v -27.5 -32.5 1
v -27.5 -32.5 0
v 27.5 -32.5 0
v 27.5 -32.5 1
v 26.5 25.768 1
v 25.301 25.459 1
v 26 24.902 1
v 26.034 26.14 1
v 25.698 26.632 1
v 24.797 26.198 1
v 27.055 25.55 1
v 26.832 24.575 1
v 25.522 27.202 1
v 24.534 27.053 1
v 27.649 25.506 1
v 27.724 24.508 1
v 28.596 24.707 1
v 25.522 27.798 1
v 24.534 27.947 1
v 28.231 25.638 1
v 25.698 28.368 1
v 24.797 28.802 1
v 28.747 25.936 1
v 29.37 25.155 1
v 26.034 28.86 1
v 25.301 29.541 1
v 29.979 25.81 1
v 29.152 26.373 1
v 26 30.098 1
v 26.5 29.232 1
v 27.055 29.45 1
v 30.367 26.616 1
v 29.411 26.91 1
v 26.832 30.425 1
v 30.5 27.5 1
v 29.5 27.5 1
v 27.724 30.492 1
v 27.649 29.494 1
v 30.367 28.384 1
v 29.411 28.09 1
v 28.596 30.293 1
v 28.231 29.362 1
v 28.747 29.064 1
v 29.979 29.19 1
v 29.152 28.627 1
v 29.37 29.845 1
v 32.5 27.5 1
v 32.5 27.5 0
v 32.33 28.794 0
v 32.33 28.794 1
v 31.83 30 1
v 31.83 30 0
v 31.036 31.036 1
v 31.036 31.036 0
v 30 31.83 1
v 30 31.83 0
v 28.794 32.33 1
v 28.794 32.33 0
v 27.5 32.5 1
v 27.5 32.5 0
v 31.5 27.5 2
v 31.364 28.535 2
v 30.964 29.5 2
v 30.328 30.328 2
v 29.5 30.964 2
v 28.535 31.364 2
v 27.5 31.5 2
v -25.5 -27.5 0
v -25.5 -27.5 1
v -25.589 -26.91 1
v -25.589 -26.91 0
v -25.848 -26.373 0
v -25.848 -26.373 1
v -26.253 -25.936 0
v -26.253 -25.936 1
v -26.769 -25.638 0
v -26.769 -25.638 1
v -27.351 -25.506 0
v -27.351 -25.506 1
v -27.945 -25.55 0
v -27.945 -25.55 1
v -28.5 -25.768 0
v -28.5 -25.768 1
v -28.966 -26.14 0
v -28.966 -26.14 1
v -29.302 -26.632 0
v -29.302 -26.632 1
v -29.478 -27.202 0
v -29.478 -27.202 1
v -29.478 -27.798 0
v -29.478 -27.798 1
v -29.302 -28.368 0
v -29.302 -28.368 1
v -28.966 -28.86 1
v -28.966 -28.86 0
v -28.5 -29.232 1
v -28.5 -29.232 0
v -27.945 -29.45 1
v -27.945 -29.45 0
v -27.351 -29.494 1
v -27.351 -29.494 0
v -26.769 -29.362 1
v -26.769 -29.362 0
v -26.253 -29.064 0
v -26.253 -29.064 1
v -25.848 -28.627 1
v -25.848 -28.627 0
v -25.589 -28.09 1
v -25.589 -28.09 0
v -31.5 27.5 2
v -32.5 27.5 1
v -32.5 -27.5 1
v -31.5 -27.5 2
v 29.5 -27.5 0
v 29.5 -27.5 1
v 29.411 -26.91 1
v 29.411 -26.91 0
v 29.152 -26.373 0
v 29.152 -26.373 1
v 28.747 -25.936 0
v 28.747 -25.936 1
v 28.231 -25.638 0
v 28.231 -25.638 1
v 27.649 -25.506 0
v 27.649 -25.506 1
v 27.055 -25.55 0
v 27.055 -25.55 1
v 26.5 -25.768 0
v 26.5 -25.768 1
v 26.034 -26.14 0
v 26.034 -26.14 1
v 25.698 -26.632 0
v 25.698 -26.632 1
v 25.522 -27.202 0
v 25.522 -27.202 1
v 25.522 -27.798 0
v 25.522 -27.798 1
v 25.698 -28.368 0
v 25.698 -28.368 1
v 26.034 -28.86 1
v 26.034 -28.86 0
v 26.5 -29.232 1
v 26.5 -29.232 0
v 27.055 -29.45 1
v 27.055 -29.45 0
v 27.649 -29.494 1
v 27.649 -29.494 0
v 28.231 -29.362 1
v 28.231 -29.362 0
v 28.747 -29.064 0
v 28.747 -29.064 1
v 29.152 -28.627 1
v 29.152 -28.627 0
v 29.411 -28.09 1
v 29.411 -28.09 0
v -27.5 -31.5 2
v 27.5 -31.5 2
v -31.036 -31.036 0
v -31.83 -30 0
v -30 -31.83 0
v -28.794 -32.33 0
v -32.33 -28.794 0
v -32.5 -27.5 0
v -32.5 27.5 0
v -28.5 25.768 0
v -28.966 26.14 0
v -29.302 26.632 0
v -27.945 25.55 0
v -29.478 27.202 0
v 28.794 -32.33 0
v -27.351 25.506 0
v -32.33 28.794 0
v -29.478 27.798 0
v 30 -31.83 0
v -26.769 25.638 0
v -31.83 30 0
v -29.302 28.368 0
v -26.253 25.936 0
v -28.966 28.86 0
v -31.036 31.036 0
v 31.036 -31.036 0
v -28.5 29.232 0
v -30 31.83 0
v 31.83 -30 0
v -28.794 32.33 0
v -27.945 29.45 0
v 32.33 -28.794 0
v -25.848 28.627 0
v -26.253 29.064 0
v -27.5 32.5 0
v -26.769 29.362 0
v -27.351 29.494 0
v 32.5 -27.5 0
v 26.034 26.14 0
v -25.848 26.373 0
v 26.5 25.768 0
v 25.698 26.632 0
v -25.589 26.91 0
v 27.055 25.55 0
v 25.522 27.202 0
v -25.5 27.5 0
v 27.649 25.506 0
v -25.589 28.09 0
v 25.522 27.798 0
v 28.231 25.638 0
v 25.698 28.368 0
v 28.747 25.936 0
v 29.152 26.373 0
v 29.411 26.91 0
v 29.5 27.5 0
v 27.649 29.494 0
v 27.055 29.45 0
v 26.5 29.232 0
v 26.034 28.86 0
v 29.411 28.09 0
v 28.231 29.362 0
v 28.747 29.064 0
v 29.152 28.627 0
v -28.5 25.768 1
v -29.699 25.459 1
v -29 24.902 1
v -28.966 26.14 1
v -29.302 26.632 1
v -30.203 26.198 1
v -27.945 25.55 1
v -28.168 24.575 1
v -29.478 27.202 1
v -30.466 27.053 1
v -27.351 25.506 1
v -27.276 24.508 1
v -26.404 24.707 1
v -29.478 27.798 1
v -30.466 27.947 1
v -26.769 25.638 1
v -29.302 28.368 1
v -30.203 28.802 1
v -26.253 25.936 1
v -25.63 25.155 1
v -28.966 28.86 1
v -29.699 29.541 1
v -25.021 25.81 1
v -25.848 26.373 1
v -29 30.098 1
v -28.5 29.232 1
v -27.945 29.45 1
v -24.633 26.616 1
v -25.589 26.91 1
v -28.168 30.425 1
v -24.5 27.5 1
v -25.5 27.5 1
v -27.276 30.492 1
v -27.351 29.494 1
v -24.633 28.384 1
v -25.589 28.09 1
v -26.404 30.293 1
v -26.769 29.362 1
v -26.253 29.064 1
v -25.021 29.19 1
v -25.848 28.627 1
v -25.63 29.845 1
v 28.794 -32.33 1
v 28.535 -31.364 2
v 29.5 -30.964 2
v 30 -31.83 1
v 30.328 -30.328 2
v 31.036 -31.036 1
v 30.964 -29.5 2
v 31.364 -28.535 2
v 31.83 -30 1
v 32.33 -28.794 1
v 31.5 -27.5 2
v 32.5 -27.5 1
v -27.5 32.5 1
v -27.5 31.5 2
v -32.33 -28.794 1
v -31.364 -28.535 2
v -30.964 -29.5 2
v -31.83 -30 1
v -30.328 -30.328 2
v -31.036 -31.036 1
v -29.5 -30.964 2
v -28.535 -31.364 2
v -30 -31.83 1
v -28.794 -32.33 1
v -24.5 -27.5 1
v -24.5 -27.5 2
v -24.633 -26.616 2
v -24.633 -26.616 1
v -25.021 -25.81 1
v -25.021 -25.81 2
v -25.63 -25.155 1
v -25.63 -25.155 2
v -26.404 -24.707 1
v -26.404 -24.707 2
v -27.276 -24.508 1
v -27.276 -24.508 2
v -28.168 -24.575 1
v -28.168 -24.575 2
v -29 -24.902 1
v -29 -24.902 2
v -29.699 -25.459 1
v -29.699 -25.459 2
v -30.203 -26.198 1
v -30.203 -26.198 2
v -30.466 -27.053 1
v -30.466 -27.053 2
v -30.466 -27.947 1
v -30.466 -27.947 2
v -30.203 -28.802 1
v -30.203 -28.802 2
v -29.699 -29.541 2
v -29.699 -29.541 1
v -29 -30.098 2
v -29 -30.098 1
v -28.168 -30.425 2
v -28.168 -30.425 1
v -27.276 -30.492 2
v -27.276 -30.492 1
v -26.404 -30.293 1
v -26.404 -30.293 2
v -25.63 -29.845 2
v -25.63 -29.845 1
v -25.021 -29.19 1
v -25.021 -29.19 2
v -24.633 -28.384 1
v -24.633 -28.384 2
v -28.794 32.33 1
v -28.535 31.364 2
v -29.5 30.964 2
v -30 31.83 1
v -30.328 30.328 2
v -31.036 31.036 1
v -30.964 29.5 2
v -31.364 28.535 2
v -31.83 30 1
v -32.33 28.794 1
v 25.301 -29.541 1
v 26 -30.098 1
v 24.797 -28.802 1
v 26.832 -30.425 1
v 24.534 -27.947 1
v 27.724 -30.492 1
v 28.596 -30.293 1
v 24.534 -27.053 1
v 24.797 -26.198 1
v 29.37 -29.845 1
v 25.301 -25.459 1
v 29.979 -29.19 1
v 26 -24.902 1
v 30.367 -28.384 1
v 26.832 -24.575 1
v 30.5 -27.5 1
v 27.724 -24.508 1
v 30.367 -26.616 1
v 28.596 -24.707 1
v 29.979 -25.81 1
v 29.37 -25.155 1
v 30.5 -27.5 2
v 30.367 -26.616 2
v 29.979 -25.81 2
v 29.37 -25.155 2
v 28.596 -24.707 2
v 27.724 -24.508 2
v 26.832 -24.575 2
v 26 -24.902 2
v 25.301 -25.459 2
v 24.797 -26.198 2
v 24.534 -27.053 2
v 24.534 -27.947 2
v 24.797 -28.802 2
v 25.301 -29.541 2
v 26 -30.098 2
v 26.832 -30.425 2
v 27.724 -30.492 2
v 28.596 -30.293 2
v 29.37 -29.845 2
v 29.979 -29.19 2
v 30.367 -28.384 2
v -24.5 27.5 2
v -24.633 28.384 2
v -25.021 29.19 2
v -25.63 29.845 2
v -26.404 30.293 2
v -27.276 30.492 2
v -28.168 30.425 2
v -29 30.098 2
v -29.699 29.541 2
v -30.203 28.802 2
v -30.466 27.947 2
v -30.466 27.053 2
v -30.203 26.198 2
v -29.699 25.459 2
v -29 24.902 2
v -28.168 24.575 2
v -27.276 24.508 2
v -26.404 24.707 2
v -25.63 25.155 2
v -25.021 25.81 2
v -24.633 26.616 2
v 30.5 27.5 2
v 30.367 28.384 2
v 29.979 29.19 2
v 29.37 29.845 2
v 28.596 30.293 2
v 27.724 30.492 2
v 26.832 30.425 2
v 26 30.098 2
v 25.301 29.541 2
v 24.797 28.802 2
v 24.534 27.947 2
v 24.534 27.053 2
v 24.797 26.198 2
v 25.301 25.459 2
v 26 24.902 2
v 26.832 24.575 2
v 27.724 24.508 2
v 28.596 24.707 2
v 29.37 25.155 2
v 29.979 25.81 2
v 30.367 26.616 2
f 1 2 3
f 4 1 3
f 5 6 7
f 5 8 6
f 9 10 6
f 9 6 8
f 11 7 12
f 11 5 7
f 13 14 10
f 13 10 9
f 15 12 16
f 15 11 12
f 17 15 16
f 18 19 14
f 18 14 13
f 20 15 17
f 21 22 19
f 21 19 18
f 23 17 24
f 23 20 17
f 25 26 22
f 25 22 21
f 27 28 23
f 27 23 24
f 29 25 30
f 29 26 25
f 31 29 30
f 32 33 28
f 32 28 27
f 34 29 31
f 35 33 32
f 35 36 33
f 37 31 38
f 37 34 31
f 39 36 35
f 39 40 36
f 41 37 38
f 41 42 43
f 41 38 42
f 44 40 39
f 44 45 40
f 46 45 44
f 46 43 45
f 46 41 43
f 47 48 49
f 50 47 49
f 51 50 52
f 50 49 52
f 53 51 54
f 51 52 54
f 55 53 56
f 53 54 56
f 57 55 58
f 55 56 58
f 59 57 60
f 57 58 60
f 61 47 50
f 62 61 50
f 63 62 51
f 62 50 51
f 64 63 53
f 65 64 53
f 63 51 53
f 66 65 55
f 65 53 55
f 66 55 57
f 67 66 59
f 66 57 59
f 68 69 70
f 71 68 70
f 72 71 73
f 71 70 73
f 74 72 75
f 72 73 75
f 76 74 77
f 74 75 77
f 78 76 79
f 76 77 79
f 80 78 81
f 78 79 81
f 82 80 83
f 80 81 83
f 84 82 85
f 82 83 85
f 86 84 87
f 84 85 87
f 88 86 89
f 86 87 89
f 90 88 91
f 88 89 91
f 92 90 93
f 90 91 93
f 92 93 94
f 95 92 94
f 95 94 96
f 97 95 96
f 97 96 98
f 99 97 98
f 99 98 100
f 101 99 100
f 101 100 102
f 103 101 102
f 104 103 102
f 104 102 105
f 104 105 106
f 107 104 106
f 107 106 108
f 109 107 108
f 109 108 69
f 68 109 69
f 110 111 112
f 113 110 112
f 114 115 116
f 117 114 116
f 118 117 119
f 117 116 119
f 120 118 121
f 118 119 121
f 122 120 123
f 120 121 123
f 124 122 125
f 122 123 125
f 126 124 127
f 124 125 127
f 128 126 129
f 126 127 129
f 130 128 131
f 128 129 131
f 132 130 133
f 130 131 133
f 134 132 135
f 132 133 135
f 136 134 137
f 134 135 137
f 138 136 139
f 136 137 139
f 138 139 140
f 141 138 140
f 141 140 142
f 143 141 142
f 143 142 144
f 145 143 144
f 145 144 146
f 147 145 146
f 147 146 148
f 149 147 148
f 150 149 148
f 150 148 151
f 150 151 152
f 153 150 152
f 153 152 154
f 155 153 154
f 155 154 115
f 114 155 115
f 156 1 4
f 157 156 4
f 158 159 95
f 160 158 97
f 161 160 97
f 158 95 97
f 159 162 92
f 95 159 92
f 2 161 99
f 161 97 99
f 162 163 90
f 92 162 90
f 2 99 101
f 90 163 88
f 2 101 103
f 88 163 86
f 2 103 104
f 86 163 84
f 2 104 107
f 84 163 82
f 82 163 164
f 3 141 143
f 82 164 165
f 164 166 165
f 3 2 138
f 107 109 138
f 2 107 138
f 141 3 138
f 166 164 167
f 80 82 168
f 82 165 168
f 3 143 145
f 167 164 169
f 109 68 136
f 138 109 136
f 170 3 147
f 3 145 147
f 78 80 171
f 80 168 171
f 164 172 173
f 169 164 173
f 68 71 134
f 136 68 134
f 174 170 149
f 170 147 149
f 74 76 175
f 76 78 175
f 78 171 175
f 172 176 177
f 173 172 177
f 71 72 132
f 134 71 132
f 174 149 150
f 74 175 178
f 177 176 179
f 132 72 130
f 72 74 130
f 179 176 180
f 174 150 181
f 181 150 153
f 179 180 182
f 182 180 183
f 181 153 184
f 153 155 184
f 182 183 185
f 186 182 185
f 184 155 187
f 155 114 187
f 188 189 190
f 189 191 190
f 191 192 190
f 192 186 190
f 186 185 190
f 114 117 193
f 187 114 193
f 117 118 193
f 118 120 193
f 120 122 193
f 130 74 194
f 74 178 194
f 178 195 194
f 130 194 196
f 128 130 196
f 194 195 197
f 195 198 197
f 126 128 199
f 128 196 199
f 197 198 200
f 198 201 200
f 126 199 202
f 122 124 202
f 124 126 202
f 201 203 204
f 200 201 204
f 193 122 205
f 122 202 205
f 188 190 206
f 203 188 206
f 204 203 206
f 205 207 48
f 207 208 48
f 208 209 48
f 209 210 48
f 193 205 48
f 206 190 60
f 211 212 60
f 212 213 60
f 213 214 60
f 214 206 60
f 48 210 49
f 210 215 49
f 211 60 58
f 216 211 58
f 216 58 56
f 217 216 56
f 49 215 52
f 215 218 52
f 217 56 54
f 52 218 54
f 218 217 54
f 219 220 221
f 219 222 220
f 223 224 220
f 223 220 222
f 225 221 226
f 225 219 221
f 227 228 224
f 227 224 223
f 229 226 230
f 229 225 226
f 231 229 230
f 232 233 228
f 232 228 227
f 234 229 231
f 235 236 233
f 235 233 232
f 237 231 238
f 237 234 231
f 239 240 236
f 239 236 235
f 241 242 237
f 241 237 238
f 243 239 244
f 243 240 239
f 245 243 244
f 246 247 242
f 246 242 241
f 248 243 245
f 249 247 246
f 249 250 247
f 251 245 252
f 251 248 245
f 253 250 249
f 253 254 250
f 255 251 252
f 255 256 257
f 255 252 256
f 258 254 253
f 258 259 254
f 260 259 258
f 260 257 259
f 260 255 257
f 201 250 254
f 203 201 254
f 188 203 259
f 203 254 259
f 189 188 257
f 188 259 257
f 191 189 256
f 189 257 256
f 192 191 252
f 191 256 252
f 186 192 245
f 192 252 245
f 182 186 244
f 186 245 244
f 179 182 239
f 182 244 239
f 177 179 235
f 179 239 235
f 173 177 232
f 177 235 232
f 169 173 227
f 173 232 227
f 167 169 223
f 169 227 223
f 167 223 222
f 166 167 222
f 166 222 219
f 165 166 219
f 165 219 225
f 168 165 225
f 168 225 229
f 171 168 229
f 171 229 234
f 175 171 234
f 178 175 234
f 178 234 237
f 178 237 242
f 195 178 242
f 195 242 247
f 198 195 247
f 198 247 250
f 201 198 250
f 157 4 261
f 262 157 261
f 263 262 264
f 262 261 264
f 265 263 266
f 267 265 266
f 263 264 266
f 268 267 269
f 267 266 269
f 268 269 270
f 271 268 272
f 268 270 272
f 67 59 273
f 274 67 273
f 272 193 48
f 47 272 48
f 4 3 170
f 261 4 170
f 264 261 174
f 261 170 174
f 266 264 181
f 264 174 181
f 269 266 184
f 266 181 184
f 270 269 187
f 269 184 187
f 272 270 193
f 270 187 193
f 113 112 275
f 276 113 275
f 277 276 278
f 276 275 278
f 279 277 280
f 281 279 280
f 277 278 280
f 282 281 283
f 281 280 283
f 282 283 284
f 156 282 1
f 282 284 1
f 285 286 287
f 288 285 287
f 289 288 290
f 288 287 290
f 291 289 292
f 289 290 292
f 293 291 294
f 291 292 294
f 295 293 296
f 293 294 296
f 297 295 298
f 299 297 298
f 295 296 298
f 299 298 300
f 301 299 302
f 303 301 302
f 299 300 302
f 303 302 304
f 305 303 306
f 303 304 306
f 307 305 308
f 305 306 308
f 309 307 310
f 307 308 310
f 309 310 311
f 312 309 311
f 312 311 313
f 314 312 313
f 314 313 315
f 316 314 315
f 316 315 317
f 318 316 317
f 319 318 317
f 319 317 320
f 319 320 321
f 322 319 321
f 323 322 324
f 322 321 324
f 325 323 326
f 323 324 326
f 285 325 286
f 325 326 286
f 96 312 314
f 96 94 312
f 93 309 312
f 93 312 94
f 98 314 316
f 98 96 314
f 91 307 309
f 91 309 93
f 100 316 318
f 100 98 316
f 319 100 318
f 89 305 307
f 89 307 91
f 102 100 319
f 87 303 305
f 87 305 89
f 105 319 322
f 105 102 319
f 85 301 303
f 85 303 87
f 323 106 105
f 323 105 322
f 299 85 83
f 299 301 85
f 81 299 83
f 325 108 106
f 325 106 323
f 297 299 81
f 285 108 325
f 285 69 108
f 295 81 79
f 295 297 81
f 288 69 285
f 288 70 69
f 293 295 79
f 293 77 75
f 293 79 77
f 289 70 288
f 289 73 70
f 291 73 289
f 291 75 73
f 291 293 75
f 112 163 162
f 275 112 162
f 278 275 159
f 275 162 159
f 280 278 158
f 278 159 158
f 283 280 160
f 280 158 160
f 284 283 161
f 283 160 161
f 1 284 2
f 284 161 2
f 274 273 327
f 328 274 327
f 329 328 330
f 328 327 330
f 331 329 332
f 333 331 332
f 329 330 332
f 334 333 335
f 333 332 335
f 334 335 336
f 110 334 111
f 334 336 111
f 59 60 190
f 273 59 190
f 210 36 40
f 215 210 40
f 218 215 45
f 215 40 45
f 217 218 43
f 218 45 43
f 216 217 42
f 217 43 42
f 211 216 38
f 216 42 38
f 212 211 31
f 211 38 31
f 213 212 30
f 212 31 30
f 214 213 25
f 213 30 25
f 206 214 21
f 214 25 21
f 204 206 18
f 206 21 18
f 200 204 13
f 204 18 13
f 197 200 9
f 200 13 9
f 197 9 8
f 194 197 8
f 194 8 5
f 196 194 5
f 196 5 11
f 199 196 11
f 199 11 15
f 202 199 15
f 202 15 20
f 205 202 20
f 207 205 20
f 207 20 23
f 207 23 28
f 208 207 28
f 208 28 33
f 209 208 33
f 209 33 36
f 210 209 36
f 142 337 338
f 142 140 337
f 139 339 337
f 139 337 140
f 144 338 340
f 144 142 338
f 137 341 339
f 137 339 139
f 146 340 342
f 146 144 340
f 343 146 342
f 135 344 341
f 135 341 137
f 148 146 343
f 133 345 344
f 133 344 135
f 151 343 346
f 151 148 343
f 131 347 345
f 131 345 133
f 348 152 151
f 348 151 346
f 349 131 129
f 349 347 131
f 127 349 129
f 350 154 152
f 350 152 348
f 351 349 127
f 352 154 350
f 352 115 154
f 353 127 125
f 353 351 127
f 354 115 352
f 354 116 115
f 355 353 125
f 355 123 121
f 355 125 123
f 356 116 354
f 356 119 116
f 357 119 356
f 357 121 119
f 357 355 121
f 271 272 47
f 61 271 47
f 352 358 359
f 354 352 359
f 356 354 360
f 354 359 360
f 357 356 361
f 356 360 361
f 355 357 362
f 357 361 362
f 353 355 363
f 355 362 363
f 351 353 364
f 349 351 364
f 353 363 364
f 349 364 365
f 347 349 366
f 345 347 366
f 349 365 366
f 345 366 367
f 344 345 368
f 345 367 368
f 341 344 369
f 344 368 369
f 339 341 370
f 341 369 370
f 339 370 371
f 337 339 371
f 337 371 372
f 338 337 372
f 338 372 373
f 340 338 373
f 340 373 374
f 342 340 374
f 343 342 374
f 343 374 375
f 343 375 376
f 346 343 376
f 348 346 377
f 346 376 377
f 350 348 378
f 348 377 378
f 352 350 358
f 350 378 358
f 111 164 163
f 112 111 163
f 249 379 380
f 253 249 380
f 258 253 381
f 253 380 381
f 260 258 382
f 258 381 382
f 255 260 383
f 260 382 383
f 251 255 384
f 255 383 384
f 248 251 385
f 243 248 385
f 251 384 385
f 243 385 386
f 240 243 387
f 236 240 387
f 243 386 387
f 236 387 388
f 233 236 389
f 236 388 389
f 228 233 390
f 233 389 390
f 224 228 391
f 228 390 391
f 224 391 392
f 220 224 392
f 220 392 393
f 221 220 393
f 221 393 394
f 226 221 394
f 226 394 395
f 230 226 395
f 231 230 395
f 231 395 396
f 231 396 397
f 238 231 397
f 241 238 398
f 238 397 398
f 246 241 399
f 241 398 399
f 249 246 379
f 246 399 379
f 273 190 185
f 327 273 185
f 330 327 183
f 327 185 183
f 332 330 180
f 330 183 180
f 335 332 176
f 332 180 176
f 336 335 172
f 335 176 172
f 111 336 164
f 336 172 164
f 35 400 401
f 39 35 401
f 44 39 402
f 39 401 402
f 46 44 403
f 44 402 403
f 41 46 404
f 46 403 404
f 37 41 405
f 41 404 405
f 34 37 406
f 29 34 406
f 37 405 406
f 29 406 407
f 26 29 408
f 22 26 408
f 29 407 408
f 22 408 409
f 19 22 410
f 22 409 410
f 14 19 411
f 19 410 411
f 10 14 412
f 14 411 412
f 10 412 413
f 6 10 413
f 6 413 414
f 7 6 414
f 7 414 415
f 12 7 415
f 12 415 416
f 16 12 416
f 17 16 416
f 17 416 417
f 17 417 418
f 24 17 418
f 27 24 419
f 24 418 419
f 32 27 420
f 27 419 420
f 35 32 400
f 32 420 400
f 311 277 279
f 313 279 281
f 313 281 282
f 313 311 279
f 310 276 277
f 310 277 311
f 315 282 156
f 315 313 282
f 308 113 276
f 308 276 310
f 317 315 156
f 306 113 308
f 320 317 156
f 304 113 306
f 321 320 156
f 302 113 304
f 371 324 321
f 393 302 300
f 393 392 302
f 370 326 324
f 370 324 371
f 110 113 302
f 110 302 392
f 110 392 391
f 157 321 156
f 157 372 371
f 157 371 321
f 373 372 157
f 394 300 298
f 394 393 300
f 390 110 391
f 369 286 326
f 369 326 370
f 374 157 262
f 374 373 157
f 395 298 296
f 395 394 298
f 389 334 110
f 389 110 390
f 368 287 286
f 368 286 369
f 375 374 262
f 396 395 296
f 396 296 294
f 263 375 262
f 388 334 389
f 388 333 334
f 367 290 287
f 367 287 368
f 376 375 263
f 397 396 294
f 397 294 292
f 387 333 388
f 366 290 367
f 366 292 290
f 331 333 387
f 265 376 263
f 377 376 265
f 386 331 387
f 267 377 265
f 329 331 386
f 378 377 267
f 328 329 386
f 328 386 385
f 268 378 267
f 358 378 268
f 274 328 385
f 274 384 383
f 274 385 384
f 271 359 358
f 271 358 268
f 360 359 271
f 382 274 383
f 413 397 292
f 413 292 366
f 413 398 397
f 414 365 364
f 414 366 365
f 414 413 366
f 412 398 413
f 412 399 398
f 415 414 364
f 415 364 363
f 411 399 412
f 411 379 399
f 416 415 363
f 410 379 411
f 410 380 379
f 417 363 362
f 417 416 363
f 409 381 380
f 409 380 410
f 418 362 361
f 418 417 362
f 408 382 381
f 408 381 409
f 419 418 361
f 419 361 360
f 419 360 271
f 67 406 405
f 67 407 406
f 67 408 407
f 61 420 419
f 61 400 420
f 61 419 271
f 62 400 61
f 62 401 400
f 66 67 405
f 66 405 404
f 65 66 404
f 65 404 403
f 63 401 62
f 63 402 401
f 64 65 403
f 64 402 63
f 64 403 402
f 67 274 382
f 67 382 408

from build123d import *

# Parameters (mm, degrees)
F1_DEPTH = 2
F2_R     = 2
F3_DEPTH = 2
F2_R_2   = 3
F4_DEPTH = 1
F5_SIZE  = 1


with BuildPart() as f1:
    # F0 (on Top) → F1 (new body)
    with BuildSketch(Plane.XY):
        with BuildLine():
            ThreePointArc((32.5, 27.5), (31.035534, 31.035534), (27.5, 32.5))
            Line((27.5, 32.5), (-27.5, 32.5))
            ThreePointArc((-27.5, 32.5), (-31.035534, 31.035534), (-32.5, 27.5))
            Line((-32.5, 27.5), (-32.5, -27.5))
            ThreePointArc((-32.5, -27.5), (-31.035534, -31.035534), (-27.5, -32.5))
            Line((-27.5, -32.5), (27.5, -32.5))
            ThreePointArc((27.5, -32.5), (31.035534, -31.035534), (32.5, -27.5))
            Line((32.5, -27.5), (32.5, 27.5))
        make_face()
    extrude(amount=F1_DEPTH)

    # F2 (on face) → F3 (cut, through all)
    with BuildSketch(Plane.XY.offset(2)):
        with Locations((-27.5, 27.5)):
            Circle(F2_R)
        with Locations((27.5, 27.5)):
            Circle(F2_R)
        with Locations((27.5, -27.5)):
            Circle(F2_R)
        with Locations((-27.5, -27.5)):
            Circle(F2_R)
    extrude(amount=-F3_DEPTH, mode=Mode.SUBTRACT)

    # F2 (on face) → F4 (cut)
    with BuildSketch(Plane.XY.offset(2)):
        with Locations((-27.5, 27.5)):
            Circle(F2_R_2)
        with Locations((-27.5, 27.5)):
            Circle(F2_R, mode=Mode.SUBTRACT)
        with Locations((27.5, 27.5)):
            Circle(F2_R_2)
        with Locations((27.5, 27.5)):
            Circle(F2_R, mode=Mode.SUBTRACT)
        with Locations((-27.5, -27.5)):
            Circle(F2_R_2)
        with Locations((-27.5, -27.5)):
            Circle(F2_R, mode=Mode.SUBTRACT)
        with Locations((27.5, -27.5)):
            Circle(F2_R_2)
        with Locations((27.5, -27.5)):
            Circle(F2_R, mode=Mode.SUBTRACT)
    extrude(amount=-F4_DEPTH, mode=Mode.SUBTRACT)

    # F5
    f5_edges = [f1.edges().sort_by_distance(p)[0] for p in [
        (-32.5, 0, 2),
        (-31.035534, 31.035534, 2),
        (0, 32.5, 2),
        (31.035534, 31.035534, 2),
        (32.5, 0, 2),
        (31.035534, -31.035534, 2),
        (0, -32.5, 2),
        (-31.035534, -31.035534, 2),
    ]]
    chamfer(f5_edges, length=F5_SIZE)


solid = f1.part
